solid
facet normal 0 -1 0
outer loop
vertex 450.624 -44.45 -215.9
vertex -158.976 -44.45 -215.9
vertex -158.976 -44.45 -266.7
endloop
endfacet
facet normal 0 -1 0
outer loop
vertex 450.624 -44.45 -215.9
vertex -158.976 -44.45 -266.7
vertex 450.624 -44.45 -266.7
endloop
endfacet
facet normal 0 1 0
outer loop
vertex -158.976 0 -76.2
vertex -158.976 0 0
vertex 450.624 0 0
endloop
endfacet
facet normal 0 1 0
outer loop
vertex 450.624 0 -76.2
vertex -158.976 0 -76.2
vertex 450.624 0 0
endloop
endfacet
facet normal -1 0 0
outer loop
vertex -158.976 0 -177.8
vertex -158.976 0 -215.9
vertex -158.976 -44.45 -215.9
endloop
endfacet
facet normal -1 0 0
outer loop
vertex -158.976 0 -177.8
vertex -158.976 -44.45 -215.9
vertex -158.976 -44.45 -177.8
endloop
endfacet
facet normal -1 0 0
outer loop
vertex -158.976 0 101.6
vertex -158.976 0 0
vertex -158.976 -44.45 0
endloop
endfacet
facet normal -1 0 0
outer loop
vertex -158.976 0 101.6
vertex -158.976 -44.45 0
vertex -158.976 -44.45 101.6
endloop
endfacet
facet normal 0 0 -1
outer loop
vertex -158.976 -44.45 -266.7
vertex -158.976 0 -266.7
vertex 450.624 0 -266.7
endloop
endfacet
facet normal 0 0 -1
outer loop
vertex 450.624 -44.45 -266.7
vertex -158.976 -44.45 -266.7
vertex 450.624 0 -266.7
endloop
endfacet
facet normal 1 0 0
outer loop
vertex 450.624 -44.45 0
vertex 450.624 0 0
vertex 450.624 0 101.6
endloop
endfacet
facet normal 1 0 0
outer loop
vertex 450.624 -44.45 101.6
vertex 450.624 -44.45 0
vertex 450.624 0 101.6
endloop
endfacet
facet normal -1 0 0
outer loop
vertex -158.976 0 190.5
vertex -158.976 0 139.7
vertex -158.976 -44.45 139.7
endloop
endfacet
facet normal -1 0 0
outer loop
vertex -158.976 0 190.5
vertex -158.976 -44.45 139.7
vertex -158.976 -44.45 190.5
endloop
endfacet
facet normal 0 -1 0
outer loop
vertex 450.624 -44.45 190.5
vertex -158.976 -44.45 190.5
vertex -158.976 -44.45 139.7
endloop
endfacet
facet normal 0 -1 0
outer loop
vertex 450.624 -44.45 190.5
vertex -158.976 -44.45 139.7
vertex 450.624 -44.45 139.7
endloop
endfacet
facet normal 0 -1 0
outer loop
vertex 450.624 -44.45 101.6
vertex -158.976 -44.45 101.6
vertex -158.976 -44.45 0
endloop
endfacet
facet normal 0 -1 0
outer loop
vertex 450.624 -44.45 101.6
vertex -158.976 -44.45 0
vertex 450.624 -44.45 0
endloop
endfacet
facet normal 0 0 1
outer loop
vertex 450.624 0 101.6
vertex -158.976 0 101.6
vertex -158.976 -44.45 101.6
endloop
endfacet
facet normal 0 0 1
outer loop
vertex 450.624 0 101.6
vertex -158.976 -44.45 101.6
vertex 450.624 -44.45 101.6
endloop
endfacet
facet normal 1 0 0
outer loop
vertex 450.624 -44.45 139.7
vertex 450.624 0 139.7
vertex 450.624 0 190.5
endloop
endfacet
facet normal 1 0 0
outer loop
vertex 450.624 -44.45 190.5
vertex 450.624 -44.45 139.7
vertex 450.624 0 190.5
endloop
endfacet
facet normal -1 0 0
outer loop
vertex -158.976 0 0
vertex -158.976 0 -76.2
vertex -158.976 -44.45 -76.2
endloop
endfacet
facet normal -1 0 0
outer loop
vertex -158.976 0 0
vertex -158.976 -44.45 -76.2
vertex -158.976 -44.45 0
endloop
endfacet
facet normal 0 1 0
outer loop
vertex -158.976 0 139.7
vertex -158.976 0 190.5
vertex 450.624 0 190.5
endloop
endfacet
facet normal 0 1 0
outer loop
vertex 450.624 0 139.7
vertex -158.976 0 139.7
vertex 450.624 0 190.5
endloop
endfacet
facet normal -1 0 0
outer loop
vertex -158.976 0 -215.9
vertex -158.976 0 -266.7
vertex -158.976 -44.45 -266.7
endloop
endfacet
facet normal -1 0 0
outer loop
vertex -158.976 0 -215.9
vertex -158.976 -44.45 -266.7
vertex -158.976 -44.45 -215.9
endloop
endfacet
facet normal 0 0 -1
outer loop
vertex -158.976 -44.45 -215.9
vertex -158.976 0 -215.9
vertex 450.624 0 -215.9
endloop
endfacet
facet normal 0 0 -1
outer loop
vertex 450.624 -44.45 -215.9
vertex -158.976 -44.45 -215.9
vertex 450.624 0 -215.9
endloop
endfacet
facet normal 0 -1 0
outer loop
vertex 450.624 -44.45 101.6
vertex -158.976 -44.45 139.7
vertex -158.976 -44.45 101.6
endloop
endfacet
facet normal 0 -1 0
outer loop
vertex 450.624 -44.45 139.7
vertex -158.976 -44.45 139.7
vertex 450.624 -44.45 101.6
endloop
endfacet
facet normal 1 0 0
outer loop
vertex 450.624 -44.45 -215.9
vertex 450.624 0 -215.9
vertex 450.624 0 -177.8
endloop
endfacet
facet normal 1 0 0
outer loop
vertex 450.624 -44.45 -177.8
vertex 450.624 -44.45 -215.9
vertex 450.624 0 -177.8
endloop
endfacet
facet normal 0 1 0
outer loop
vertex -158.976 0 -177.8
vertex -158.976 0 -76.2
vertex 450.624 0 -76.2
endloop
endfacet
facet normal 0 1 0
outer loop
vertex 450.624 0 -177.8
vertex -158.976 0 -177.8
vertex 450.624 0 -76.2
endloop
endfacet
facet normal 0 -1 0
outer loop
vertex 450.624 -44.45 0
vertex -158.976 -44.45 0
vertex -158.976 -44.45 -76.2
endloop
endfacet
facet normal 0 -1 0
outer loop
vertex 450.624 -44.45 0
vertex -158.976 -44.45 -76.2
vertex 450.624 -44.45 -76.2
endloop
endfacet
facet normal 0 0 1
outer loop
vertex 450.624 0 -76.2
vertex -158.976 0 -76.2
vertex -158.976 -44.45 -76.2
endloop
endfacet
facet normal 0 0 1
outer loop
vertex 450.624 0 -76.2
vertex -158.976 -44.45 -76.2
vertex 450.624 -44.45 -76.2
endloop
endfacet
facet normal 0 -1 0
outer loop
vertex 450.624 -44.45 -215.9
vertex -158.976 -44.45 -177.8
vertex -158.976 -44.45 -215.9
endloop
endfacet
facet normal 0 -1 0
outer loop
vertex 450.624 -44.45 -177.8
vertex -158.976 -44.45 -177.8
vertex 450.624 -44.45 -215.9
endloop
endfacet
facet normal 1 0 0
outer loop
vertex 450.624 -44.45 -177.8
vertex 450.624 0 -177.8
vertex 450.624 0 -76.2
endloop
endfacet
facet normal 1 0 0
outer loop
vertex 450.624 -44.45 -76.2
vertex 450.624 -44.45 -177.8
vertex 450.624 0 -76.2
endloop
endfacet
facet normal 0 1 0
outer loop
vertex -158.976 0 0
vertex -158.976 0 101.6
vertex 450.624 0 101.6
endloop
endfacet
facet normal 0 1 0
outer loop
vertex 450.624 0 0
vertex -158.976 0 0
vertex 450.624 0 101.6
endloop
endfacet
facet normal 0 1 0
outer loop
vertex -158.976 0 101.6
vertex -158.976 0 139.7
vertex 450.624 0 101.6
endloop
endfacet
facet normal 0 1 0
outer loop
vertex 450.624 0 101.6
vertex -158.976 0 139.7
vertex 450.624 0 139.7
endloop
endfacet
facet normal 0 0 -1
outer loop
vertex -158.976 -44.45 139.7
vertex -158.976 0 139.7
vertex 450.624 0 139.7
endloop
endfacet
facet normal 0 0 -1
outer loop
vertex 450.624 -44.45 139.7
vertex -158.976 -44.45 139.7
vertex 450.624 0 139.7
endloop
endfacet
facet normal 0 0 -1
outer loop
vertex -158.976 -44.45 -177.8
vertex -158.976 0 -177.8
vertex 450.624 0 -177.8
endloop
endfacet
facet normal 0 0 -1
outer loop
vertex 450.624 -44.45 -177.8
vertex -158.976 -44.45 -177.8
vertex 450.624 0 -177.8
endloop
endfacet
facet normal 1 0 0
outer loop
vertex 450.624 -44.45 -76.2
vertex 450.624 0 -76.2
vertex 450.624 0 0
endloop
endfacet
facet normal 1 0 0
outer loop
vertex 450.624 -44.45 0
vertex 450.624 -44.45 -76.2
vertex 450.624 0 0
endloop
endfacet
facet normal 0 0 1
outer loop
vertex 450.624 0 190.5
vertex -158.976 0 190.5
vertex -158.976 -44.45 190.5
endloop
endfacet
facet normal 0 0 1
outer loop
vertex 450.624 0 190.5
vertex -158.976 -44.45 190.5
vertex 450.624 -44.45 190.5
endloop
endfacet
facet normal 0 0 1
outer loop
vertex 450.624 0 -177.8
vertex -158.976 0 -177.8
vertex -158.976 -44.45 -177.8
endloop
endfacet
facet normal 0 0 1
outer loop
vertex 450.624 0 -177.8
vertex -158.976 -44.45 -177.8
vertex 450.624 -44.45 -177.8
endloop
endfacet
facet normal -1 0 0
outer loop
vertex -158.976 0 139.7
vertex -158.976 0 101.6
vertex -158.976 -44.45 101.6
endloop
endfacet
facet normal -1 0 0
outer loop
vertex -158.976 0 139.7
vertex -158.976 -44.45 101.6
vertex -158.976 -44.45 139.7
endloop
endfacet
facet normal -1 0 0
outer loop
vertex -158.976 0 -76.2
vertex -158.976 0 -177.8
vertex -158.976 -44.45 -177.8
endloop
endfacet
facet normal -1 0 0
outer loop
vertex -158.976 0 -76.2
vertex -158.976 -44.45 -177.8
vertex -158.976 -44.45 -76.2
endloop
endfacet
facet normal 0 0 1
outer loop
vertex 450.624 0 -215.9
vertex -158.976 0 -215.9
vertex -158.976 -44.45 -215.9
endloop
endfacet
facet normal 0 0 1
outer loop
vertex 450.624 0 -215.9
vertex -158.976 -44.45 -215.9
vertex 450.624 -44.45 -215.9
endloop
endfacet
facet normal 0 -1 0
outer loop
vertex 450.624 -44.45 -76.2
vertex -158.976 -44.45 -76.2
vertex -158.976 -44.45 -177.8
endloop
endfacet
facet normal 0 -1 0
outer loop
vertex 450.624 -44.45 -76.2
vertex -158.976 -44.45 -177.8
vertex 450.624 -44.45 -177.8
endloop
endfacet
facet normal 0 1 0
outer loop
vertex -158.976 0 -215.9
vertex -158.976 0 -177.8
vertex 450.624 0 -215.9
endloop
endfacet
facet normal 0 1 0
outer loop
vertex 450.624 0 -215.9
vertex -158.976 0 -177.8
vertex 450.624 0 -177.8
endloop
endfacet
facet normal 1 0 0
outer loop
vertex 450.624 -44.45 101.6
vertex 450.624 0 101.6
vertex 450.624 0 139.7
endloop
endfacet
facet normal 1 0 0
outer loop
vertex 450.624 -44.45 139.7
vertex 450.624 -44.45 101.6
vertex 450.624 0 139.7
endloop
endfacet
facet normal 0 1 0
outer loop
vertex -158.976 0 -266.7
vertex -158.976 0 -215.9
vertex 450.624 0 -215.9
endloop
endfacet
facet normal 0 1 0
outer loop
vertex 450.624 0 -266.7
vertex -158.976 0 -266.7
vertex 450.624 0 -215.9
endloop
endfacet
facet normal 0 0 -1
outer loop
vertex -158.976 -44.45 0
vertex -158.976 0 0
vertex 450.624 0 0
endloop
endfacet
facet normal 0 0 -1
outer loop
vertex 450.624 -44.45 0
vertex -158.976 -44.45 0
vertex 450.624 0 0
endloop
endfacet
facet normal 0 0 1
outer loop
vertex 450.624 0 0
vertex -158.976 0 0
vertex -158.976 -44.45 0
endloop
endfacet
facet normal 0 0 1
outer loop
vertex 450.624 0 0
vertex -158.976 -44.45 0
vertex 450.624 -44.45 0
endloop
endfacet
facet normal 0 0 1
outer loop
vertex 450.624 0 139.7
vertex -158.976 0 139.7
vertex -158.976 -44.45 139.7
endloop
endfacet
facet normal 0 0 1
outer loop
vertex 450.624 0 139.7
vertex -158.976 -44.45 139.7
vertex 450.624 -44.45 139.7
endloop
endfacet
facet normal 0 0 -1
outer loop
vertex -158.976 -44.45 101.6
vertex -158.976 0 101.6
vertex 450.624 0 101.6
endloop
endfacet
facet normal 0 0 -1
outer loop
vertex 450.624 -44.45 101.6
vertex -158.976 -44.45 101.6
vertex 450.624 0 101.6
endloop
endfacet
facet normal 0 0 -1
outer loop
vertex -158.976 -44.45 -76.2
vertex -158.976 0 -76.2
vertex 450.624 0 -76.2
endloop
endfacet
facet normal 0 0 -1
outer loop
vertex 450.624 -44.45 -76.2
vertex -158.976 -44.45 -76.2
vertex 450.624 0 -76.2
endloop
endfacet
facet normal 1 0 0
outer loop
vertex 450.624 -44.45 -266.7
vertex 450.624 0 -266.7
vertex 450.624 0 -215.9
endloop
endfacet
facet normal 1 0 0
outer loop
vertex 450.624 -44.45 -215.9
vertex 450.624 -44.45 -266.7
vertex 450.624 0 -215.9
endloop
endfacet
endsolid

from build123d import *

# Parameters (mm, degrees)
F0_W     = 609.6
F0_H     = 38.1
F1_DEPTH = 44.45
F2_DEPTH = 44.45
F0_H_2   = 101.6
F0_H_3   = 50.8
F3_DEPTH = 44.45
F0_H_4   = 76.2
F4_DEPTH = 44.45
F5_DEPTH = 44.45


with BuildPart() as f1:
    # F0 (on Front) → F1 (new body)
    with BuildSketch(Plane.XZ):
        with Locations((145.823698, 120.65)):
            Rectangle(F0_W, F0_H)
    extrude(amount=F1_DEPTH)


with BuildPart() as f2:
    # F0 (on Front) → F2 (new body)
    with BuildSketch(Plane.XZ):
        with Locations((145.823698, -196.85)):
            Rectangle(F0_W, F0_H)
    extrude(amount=F2_DEPTH)


with BuildPart() as f3:
    # F0 (on Front) → F3 (new body)
    with BuildSketch(Plane.XZ):
        with Locations((145.823698, 50.8)):
            Rectangle(F0_W, F0_H_2)
        with Locations((145.823698, 165.1)):
            Rectangle(F0_W, F0_H_3)
        with Locations((145.823698, -241.3)):
            Rectangle(F0_W, F0_H_3)
    extrude(amount=F3_DEPTH)


with BuildPart() as f4:
    # F0 (on Front) → F4 (new body)
    with BuildSketch(Plane.XZ):
        with Locations((145.823698, -38.1)):
            Rectangle(F0_W, F0_H_4)
    extrude(amount=F4_DEPTH)


with BuildPart() as f5:
    # F0 (on Front) → F5 (new body)
    with BuildSketch(Plane.XZ):
        with Locations((145.823698, -127)):
            Rectangle(F0_W, F0_H_2)
    extrude(amount=F5_DEPTH)


solid = Compound([f1.part, f2.part, f3.part, f4.part, f5.part])
